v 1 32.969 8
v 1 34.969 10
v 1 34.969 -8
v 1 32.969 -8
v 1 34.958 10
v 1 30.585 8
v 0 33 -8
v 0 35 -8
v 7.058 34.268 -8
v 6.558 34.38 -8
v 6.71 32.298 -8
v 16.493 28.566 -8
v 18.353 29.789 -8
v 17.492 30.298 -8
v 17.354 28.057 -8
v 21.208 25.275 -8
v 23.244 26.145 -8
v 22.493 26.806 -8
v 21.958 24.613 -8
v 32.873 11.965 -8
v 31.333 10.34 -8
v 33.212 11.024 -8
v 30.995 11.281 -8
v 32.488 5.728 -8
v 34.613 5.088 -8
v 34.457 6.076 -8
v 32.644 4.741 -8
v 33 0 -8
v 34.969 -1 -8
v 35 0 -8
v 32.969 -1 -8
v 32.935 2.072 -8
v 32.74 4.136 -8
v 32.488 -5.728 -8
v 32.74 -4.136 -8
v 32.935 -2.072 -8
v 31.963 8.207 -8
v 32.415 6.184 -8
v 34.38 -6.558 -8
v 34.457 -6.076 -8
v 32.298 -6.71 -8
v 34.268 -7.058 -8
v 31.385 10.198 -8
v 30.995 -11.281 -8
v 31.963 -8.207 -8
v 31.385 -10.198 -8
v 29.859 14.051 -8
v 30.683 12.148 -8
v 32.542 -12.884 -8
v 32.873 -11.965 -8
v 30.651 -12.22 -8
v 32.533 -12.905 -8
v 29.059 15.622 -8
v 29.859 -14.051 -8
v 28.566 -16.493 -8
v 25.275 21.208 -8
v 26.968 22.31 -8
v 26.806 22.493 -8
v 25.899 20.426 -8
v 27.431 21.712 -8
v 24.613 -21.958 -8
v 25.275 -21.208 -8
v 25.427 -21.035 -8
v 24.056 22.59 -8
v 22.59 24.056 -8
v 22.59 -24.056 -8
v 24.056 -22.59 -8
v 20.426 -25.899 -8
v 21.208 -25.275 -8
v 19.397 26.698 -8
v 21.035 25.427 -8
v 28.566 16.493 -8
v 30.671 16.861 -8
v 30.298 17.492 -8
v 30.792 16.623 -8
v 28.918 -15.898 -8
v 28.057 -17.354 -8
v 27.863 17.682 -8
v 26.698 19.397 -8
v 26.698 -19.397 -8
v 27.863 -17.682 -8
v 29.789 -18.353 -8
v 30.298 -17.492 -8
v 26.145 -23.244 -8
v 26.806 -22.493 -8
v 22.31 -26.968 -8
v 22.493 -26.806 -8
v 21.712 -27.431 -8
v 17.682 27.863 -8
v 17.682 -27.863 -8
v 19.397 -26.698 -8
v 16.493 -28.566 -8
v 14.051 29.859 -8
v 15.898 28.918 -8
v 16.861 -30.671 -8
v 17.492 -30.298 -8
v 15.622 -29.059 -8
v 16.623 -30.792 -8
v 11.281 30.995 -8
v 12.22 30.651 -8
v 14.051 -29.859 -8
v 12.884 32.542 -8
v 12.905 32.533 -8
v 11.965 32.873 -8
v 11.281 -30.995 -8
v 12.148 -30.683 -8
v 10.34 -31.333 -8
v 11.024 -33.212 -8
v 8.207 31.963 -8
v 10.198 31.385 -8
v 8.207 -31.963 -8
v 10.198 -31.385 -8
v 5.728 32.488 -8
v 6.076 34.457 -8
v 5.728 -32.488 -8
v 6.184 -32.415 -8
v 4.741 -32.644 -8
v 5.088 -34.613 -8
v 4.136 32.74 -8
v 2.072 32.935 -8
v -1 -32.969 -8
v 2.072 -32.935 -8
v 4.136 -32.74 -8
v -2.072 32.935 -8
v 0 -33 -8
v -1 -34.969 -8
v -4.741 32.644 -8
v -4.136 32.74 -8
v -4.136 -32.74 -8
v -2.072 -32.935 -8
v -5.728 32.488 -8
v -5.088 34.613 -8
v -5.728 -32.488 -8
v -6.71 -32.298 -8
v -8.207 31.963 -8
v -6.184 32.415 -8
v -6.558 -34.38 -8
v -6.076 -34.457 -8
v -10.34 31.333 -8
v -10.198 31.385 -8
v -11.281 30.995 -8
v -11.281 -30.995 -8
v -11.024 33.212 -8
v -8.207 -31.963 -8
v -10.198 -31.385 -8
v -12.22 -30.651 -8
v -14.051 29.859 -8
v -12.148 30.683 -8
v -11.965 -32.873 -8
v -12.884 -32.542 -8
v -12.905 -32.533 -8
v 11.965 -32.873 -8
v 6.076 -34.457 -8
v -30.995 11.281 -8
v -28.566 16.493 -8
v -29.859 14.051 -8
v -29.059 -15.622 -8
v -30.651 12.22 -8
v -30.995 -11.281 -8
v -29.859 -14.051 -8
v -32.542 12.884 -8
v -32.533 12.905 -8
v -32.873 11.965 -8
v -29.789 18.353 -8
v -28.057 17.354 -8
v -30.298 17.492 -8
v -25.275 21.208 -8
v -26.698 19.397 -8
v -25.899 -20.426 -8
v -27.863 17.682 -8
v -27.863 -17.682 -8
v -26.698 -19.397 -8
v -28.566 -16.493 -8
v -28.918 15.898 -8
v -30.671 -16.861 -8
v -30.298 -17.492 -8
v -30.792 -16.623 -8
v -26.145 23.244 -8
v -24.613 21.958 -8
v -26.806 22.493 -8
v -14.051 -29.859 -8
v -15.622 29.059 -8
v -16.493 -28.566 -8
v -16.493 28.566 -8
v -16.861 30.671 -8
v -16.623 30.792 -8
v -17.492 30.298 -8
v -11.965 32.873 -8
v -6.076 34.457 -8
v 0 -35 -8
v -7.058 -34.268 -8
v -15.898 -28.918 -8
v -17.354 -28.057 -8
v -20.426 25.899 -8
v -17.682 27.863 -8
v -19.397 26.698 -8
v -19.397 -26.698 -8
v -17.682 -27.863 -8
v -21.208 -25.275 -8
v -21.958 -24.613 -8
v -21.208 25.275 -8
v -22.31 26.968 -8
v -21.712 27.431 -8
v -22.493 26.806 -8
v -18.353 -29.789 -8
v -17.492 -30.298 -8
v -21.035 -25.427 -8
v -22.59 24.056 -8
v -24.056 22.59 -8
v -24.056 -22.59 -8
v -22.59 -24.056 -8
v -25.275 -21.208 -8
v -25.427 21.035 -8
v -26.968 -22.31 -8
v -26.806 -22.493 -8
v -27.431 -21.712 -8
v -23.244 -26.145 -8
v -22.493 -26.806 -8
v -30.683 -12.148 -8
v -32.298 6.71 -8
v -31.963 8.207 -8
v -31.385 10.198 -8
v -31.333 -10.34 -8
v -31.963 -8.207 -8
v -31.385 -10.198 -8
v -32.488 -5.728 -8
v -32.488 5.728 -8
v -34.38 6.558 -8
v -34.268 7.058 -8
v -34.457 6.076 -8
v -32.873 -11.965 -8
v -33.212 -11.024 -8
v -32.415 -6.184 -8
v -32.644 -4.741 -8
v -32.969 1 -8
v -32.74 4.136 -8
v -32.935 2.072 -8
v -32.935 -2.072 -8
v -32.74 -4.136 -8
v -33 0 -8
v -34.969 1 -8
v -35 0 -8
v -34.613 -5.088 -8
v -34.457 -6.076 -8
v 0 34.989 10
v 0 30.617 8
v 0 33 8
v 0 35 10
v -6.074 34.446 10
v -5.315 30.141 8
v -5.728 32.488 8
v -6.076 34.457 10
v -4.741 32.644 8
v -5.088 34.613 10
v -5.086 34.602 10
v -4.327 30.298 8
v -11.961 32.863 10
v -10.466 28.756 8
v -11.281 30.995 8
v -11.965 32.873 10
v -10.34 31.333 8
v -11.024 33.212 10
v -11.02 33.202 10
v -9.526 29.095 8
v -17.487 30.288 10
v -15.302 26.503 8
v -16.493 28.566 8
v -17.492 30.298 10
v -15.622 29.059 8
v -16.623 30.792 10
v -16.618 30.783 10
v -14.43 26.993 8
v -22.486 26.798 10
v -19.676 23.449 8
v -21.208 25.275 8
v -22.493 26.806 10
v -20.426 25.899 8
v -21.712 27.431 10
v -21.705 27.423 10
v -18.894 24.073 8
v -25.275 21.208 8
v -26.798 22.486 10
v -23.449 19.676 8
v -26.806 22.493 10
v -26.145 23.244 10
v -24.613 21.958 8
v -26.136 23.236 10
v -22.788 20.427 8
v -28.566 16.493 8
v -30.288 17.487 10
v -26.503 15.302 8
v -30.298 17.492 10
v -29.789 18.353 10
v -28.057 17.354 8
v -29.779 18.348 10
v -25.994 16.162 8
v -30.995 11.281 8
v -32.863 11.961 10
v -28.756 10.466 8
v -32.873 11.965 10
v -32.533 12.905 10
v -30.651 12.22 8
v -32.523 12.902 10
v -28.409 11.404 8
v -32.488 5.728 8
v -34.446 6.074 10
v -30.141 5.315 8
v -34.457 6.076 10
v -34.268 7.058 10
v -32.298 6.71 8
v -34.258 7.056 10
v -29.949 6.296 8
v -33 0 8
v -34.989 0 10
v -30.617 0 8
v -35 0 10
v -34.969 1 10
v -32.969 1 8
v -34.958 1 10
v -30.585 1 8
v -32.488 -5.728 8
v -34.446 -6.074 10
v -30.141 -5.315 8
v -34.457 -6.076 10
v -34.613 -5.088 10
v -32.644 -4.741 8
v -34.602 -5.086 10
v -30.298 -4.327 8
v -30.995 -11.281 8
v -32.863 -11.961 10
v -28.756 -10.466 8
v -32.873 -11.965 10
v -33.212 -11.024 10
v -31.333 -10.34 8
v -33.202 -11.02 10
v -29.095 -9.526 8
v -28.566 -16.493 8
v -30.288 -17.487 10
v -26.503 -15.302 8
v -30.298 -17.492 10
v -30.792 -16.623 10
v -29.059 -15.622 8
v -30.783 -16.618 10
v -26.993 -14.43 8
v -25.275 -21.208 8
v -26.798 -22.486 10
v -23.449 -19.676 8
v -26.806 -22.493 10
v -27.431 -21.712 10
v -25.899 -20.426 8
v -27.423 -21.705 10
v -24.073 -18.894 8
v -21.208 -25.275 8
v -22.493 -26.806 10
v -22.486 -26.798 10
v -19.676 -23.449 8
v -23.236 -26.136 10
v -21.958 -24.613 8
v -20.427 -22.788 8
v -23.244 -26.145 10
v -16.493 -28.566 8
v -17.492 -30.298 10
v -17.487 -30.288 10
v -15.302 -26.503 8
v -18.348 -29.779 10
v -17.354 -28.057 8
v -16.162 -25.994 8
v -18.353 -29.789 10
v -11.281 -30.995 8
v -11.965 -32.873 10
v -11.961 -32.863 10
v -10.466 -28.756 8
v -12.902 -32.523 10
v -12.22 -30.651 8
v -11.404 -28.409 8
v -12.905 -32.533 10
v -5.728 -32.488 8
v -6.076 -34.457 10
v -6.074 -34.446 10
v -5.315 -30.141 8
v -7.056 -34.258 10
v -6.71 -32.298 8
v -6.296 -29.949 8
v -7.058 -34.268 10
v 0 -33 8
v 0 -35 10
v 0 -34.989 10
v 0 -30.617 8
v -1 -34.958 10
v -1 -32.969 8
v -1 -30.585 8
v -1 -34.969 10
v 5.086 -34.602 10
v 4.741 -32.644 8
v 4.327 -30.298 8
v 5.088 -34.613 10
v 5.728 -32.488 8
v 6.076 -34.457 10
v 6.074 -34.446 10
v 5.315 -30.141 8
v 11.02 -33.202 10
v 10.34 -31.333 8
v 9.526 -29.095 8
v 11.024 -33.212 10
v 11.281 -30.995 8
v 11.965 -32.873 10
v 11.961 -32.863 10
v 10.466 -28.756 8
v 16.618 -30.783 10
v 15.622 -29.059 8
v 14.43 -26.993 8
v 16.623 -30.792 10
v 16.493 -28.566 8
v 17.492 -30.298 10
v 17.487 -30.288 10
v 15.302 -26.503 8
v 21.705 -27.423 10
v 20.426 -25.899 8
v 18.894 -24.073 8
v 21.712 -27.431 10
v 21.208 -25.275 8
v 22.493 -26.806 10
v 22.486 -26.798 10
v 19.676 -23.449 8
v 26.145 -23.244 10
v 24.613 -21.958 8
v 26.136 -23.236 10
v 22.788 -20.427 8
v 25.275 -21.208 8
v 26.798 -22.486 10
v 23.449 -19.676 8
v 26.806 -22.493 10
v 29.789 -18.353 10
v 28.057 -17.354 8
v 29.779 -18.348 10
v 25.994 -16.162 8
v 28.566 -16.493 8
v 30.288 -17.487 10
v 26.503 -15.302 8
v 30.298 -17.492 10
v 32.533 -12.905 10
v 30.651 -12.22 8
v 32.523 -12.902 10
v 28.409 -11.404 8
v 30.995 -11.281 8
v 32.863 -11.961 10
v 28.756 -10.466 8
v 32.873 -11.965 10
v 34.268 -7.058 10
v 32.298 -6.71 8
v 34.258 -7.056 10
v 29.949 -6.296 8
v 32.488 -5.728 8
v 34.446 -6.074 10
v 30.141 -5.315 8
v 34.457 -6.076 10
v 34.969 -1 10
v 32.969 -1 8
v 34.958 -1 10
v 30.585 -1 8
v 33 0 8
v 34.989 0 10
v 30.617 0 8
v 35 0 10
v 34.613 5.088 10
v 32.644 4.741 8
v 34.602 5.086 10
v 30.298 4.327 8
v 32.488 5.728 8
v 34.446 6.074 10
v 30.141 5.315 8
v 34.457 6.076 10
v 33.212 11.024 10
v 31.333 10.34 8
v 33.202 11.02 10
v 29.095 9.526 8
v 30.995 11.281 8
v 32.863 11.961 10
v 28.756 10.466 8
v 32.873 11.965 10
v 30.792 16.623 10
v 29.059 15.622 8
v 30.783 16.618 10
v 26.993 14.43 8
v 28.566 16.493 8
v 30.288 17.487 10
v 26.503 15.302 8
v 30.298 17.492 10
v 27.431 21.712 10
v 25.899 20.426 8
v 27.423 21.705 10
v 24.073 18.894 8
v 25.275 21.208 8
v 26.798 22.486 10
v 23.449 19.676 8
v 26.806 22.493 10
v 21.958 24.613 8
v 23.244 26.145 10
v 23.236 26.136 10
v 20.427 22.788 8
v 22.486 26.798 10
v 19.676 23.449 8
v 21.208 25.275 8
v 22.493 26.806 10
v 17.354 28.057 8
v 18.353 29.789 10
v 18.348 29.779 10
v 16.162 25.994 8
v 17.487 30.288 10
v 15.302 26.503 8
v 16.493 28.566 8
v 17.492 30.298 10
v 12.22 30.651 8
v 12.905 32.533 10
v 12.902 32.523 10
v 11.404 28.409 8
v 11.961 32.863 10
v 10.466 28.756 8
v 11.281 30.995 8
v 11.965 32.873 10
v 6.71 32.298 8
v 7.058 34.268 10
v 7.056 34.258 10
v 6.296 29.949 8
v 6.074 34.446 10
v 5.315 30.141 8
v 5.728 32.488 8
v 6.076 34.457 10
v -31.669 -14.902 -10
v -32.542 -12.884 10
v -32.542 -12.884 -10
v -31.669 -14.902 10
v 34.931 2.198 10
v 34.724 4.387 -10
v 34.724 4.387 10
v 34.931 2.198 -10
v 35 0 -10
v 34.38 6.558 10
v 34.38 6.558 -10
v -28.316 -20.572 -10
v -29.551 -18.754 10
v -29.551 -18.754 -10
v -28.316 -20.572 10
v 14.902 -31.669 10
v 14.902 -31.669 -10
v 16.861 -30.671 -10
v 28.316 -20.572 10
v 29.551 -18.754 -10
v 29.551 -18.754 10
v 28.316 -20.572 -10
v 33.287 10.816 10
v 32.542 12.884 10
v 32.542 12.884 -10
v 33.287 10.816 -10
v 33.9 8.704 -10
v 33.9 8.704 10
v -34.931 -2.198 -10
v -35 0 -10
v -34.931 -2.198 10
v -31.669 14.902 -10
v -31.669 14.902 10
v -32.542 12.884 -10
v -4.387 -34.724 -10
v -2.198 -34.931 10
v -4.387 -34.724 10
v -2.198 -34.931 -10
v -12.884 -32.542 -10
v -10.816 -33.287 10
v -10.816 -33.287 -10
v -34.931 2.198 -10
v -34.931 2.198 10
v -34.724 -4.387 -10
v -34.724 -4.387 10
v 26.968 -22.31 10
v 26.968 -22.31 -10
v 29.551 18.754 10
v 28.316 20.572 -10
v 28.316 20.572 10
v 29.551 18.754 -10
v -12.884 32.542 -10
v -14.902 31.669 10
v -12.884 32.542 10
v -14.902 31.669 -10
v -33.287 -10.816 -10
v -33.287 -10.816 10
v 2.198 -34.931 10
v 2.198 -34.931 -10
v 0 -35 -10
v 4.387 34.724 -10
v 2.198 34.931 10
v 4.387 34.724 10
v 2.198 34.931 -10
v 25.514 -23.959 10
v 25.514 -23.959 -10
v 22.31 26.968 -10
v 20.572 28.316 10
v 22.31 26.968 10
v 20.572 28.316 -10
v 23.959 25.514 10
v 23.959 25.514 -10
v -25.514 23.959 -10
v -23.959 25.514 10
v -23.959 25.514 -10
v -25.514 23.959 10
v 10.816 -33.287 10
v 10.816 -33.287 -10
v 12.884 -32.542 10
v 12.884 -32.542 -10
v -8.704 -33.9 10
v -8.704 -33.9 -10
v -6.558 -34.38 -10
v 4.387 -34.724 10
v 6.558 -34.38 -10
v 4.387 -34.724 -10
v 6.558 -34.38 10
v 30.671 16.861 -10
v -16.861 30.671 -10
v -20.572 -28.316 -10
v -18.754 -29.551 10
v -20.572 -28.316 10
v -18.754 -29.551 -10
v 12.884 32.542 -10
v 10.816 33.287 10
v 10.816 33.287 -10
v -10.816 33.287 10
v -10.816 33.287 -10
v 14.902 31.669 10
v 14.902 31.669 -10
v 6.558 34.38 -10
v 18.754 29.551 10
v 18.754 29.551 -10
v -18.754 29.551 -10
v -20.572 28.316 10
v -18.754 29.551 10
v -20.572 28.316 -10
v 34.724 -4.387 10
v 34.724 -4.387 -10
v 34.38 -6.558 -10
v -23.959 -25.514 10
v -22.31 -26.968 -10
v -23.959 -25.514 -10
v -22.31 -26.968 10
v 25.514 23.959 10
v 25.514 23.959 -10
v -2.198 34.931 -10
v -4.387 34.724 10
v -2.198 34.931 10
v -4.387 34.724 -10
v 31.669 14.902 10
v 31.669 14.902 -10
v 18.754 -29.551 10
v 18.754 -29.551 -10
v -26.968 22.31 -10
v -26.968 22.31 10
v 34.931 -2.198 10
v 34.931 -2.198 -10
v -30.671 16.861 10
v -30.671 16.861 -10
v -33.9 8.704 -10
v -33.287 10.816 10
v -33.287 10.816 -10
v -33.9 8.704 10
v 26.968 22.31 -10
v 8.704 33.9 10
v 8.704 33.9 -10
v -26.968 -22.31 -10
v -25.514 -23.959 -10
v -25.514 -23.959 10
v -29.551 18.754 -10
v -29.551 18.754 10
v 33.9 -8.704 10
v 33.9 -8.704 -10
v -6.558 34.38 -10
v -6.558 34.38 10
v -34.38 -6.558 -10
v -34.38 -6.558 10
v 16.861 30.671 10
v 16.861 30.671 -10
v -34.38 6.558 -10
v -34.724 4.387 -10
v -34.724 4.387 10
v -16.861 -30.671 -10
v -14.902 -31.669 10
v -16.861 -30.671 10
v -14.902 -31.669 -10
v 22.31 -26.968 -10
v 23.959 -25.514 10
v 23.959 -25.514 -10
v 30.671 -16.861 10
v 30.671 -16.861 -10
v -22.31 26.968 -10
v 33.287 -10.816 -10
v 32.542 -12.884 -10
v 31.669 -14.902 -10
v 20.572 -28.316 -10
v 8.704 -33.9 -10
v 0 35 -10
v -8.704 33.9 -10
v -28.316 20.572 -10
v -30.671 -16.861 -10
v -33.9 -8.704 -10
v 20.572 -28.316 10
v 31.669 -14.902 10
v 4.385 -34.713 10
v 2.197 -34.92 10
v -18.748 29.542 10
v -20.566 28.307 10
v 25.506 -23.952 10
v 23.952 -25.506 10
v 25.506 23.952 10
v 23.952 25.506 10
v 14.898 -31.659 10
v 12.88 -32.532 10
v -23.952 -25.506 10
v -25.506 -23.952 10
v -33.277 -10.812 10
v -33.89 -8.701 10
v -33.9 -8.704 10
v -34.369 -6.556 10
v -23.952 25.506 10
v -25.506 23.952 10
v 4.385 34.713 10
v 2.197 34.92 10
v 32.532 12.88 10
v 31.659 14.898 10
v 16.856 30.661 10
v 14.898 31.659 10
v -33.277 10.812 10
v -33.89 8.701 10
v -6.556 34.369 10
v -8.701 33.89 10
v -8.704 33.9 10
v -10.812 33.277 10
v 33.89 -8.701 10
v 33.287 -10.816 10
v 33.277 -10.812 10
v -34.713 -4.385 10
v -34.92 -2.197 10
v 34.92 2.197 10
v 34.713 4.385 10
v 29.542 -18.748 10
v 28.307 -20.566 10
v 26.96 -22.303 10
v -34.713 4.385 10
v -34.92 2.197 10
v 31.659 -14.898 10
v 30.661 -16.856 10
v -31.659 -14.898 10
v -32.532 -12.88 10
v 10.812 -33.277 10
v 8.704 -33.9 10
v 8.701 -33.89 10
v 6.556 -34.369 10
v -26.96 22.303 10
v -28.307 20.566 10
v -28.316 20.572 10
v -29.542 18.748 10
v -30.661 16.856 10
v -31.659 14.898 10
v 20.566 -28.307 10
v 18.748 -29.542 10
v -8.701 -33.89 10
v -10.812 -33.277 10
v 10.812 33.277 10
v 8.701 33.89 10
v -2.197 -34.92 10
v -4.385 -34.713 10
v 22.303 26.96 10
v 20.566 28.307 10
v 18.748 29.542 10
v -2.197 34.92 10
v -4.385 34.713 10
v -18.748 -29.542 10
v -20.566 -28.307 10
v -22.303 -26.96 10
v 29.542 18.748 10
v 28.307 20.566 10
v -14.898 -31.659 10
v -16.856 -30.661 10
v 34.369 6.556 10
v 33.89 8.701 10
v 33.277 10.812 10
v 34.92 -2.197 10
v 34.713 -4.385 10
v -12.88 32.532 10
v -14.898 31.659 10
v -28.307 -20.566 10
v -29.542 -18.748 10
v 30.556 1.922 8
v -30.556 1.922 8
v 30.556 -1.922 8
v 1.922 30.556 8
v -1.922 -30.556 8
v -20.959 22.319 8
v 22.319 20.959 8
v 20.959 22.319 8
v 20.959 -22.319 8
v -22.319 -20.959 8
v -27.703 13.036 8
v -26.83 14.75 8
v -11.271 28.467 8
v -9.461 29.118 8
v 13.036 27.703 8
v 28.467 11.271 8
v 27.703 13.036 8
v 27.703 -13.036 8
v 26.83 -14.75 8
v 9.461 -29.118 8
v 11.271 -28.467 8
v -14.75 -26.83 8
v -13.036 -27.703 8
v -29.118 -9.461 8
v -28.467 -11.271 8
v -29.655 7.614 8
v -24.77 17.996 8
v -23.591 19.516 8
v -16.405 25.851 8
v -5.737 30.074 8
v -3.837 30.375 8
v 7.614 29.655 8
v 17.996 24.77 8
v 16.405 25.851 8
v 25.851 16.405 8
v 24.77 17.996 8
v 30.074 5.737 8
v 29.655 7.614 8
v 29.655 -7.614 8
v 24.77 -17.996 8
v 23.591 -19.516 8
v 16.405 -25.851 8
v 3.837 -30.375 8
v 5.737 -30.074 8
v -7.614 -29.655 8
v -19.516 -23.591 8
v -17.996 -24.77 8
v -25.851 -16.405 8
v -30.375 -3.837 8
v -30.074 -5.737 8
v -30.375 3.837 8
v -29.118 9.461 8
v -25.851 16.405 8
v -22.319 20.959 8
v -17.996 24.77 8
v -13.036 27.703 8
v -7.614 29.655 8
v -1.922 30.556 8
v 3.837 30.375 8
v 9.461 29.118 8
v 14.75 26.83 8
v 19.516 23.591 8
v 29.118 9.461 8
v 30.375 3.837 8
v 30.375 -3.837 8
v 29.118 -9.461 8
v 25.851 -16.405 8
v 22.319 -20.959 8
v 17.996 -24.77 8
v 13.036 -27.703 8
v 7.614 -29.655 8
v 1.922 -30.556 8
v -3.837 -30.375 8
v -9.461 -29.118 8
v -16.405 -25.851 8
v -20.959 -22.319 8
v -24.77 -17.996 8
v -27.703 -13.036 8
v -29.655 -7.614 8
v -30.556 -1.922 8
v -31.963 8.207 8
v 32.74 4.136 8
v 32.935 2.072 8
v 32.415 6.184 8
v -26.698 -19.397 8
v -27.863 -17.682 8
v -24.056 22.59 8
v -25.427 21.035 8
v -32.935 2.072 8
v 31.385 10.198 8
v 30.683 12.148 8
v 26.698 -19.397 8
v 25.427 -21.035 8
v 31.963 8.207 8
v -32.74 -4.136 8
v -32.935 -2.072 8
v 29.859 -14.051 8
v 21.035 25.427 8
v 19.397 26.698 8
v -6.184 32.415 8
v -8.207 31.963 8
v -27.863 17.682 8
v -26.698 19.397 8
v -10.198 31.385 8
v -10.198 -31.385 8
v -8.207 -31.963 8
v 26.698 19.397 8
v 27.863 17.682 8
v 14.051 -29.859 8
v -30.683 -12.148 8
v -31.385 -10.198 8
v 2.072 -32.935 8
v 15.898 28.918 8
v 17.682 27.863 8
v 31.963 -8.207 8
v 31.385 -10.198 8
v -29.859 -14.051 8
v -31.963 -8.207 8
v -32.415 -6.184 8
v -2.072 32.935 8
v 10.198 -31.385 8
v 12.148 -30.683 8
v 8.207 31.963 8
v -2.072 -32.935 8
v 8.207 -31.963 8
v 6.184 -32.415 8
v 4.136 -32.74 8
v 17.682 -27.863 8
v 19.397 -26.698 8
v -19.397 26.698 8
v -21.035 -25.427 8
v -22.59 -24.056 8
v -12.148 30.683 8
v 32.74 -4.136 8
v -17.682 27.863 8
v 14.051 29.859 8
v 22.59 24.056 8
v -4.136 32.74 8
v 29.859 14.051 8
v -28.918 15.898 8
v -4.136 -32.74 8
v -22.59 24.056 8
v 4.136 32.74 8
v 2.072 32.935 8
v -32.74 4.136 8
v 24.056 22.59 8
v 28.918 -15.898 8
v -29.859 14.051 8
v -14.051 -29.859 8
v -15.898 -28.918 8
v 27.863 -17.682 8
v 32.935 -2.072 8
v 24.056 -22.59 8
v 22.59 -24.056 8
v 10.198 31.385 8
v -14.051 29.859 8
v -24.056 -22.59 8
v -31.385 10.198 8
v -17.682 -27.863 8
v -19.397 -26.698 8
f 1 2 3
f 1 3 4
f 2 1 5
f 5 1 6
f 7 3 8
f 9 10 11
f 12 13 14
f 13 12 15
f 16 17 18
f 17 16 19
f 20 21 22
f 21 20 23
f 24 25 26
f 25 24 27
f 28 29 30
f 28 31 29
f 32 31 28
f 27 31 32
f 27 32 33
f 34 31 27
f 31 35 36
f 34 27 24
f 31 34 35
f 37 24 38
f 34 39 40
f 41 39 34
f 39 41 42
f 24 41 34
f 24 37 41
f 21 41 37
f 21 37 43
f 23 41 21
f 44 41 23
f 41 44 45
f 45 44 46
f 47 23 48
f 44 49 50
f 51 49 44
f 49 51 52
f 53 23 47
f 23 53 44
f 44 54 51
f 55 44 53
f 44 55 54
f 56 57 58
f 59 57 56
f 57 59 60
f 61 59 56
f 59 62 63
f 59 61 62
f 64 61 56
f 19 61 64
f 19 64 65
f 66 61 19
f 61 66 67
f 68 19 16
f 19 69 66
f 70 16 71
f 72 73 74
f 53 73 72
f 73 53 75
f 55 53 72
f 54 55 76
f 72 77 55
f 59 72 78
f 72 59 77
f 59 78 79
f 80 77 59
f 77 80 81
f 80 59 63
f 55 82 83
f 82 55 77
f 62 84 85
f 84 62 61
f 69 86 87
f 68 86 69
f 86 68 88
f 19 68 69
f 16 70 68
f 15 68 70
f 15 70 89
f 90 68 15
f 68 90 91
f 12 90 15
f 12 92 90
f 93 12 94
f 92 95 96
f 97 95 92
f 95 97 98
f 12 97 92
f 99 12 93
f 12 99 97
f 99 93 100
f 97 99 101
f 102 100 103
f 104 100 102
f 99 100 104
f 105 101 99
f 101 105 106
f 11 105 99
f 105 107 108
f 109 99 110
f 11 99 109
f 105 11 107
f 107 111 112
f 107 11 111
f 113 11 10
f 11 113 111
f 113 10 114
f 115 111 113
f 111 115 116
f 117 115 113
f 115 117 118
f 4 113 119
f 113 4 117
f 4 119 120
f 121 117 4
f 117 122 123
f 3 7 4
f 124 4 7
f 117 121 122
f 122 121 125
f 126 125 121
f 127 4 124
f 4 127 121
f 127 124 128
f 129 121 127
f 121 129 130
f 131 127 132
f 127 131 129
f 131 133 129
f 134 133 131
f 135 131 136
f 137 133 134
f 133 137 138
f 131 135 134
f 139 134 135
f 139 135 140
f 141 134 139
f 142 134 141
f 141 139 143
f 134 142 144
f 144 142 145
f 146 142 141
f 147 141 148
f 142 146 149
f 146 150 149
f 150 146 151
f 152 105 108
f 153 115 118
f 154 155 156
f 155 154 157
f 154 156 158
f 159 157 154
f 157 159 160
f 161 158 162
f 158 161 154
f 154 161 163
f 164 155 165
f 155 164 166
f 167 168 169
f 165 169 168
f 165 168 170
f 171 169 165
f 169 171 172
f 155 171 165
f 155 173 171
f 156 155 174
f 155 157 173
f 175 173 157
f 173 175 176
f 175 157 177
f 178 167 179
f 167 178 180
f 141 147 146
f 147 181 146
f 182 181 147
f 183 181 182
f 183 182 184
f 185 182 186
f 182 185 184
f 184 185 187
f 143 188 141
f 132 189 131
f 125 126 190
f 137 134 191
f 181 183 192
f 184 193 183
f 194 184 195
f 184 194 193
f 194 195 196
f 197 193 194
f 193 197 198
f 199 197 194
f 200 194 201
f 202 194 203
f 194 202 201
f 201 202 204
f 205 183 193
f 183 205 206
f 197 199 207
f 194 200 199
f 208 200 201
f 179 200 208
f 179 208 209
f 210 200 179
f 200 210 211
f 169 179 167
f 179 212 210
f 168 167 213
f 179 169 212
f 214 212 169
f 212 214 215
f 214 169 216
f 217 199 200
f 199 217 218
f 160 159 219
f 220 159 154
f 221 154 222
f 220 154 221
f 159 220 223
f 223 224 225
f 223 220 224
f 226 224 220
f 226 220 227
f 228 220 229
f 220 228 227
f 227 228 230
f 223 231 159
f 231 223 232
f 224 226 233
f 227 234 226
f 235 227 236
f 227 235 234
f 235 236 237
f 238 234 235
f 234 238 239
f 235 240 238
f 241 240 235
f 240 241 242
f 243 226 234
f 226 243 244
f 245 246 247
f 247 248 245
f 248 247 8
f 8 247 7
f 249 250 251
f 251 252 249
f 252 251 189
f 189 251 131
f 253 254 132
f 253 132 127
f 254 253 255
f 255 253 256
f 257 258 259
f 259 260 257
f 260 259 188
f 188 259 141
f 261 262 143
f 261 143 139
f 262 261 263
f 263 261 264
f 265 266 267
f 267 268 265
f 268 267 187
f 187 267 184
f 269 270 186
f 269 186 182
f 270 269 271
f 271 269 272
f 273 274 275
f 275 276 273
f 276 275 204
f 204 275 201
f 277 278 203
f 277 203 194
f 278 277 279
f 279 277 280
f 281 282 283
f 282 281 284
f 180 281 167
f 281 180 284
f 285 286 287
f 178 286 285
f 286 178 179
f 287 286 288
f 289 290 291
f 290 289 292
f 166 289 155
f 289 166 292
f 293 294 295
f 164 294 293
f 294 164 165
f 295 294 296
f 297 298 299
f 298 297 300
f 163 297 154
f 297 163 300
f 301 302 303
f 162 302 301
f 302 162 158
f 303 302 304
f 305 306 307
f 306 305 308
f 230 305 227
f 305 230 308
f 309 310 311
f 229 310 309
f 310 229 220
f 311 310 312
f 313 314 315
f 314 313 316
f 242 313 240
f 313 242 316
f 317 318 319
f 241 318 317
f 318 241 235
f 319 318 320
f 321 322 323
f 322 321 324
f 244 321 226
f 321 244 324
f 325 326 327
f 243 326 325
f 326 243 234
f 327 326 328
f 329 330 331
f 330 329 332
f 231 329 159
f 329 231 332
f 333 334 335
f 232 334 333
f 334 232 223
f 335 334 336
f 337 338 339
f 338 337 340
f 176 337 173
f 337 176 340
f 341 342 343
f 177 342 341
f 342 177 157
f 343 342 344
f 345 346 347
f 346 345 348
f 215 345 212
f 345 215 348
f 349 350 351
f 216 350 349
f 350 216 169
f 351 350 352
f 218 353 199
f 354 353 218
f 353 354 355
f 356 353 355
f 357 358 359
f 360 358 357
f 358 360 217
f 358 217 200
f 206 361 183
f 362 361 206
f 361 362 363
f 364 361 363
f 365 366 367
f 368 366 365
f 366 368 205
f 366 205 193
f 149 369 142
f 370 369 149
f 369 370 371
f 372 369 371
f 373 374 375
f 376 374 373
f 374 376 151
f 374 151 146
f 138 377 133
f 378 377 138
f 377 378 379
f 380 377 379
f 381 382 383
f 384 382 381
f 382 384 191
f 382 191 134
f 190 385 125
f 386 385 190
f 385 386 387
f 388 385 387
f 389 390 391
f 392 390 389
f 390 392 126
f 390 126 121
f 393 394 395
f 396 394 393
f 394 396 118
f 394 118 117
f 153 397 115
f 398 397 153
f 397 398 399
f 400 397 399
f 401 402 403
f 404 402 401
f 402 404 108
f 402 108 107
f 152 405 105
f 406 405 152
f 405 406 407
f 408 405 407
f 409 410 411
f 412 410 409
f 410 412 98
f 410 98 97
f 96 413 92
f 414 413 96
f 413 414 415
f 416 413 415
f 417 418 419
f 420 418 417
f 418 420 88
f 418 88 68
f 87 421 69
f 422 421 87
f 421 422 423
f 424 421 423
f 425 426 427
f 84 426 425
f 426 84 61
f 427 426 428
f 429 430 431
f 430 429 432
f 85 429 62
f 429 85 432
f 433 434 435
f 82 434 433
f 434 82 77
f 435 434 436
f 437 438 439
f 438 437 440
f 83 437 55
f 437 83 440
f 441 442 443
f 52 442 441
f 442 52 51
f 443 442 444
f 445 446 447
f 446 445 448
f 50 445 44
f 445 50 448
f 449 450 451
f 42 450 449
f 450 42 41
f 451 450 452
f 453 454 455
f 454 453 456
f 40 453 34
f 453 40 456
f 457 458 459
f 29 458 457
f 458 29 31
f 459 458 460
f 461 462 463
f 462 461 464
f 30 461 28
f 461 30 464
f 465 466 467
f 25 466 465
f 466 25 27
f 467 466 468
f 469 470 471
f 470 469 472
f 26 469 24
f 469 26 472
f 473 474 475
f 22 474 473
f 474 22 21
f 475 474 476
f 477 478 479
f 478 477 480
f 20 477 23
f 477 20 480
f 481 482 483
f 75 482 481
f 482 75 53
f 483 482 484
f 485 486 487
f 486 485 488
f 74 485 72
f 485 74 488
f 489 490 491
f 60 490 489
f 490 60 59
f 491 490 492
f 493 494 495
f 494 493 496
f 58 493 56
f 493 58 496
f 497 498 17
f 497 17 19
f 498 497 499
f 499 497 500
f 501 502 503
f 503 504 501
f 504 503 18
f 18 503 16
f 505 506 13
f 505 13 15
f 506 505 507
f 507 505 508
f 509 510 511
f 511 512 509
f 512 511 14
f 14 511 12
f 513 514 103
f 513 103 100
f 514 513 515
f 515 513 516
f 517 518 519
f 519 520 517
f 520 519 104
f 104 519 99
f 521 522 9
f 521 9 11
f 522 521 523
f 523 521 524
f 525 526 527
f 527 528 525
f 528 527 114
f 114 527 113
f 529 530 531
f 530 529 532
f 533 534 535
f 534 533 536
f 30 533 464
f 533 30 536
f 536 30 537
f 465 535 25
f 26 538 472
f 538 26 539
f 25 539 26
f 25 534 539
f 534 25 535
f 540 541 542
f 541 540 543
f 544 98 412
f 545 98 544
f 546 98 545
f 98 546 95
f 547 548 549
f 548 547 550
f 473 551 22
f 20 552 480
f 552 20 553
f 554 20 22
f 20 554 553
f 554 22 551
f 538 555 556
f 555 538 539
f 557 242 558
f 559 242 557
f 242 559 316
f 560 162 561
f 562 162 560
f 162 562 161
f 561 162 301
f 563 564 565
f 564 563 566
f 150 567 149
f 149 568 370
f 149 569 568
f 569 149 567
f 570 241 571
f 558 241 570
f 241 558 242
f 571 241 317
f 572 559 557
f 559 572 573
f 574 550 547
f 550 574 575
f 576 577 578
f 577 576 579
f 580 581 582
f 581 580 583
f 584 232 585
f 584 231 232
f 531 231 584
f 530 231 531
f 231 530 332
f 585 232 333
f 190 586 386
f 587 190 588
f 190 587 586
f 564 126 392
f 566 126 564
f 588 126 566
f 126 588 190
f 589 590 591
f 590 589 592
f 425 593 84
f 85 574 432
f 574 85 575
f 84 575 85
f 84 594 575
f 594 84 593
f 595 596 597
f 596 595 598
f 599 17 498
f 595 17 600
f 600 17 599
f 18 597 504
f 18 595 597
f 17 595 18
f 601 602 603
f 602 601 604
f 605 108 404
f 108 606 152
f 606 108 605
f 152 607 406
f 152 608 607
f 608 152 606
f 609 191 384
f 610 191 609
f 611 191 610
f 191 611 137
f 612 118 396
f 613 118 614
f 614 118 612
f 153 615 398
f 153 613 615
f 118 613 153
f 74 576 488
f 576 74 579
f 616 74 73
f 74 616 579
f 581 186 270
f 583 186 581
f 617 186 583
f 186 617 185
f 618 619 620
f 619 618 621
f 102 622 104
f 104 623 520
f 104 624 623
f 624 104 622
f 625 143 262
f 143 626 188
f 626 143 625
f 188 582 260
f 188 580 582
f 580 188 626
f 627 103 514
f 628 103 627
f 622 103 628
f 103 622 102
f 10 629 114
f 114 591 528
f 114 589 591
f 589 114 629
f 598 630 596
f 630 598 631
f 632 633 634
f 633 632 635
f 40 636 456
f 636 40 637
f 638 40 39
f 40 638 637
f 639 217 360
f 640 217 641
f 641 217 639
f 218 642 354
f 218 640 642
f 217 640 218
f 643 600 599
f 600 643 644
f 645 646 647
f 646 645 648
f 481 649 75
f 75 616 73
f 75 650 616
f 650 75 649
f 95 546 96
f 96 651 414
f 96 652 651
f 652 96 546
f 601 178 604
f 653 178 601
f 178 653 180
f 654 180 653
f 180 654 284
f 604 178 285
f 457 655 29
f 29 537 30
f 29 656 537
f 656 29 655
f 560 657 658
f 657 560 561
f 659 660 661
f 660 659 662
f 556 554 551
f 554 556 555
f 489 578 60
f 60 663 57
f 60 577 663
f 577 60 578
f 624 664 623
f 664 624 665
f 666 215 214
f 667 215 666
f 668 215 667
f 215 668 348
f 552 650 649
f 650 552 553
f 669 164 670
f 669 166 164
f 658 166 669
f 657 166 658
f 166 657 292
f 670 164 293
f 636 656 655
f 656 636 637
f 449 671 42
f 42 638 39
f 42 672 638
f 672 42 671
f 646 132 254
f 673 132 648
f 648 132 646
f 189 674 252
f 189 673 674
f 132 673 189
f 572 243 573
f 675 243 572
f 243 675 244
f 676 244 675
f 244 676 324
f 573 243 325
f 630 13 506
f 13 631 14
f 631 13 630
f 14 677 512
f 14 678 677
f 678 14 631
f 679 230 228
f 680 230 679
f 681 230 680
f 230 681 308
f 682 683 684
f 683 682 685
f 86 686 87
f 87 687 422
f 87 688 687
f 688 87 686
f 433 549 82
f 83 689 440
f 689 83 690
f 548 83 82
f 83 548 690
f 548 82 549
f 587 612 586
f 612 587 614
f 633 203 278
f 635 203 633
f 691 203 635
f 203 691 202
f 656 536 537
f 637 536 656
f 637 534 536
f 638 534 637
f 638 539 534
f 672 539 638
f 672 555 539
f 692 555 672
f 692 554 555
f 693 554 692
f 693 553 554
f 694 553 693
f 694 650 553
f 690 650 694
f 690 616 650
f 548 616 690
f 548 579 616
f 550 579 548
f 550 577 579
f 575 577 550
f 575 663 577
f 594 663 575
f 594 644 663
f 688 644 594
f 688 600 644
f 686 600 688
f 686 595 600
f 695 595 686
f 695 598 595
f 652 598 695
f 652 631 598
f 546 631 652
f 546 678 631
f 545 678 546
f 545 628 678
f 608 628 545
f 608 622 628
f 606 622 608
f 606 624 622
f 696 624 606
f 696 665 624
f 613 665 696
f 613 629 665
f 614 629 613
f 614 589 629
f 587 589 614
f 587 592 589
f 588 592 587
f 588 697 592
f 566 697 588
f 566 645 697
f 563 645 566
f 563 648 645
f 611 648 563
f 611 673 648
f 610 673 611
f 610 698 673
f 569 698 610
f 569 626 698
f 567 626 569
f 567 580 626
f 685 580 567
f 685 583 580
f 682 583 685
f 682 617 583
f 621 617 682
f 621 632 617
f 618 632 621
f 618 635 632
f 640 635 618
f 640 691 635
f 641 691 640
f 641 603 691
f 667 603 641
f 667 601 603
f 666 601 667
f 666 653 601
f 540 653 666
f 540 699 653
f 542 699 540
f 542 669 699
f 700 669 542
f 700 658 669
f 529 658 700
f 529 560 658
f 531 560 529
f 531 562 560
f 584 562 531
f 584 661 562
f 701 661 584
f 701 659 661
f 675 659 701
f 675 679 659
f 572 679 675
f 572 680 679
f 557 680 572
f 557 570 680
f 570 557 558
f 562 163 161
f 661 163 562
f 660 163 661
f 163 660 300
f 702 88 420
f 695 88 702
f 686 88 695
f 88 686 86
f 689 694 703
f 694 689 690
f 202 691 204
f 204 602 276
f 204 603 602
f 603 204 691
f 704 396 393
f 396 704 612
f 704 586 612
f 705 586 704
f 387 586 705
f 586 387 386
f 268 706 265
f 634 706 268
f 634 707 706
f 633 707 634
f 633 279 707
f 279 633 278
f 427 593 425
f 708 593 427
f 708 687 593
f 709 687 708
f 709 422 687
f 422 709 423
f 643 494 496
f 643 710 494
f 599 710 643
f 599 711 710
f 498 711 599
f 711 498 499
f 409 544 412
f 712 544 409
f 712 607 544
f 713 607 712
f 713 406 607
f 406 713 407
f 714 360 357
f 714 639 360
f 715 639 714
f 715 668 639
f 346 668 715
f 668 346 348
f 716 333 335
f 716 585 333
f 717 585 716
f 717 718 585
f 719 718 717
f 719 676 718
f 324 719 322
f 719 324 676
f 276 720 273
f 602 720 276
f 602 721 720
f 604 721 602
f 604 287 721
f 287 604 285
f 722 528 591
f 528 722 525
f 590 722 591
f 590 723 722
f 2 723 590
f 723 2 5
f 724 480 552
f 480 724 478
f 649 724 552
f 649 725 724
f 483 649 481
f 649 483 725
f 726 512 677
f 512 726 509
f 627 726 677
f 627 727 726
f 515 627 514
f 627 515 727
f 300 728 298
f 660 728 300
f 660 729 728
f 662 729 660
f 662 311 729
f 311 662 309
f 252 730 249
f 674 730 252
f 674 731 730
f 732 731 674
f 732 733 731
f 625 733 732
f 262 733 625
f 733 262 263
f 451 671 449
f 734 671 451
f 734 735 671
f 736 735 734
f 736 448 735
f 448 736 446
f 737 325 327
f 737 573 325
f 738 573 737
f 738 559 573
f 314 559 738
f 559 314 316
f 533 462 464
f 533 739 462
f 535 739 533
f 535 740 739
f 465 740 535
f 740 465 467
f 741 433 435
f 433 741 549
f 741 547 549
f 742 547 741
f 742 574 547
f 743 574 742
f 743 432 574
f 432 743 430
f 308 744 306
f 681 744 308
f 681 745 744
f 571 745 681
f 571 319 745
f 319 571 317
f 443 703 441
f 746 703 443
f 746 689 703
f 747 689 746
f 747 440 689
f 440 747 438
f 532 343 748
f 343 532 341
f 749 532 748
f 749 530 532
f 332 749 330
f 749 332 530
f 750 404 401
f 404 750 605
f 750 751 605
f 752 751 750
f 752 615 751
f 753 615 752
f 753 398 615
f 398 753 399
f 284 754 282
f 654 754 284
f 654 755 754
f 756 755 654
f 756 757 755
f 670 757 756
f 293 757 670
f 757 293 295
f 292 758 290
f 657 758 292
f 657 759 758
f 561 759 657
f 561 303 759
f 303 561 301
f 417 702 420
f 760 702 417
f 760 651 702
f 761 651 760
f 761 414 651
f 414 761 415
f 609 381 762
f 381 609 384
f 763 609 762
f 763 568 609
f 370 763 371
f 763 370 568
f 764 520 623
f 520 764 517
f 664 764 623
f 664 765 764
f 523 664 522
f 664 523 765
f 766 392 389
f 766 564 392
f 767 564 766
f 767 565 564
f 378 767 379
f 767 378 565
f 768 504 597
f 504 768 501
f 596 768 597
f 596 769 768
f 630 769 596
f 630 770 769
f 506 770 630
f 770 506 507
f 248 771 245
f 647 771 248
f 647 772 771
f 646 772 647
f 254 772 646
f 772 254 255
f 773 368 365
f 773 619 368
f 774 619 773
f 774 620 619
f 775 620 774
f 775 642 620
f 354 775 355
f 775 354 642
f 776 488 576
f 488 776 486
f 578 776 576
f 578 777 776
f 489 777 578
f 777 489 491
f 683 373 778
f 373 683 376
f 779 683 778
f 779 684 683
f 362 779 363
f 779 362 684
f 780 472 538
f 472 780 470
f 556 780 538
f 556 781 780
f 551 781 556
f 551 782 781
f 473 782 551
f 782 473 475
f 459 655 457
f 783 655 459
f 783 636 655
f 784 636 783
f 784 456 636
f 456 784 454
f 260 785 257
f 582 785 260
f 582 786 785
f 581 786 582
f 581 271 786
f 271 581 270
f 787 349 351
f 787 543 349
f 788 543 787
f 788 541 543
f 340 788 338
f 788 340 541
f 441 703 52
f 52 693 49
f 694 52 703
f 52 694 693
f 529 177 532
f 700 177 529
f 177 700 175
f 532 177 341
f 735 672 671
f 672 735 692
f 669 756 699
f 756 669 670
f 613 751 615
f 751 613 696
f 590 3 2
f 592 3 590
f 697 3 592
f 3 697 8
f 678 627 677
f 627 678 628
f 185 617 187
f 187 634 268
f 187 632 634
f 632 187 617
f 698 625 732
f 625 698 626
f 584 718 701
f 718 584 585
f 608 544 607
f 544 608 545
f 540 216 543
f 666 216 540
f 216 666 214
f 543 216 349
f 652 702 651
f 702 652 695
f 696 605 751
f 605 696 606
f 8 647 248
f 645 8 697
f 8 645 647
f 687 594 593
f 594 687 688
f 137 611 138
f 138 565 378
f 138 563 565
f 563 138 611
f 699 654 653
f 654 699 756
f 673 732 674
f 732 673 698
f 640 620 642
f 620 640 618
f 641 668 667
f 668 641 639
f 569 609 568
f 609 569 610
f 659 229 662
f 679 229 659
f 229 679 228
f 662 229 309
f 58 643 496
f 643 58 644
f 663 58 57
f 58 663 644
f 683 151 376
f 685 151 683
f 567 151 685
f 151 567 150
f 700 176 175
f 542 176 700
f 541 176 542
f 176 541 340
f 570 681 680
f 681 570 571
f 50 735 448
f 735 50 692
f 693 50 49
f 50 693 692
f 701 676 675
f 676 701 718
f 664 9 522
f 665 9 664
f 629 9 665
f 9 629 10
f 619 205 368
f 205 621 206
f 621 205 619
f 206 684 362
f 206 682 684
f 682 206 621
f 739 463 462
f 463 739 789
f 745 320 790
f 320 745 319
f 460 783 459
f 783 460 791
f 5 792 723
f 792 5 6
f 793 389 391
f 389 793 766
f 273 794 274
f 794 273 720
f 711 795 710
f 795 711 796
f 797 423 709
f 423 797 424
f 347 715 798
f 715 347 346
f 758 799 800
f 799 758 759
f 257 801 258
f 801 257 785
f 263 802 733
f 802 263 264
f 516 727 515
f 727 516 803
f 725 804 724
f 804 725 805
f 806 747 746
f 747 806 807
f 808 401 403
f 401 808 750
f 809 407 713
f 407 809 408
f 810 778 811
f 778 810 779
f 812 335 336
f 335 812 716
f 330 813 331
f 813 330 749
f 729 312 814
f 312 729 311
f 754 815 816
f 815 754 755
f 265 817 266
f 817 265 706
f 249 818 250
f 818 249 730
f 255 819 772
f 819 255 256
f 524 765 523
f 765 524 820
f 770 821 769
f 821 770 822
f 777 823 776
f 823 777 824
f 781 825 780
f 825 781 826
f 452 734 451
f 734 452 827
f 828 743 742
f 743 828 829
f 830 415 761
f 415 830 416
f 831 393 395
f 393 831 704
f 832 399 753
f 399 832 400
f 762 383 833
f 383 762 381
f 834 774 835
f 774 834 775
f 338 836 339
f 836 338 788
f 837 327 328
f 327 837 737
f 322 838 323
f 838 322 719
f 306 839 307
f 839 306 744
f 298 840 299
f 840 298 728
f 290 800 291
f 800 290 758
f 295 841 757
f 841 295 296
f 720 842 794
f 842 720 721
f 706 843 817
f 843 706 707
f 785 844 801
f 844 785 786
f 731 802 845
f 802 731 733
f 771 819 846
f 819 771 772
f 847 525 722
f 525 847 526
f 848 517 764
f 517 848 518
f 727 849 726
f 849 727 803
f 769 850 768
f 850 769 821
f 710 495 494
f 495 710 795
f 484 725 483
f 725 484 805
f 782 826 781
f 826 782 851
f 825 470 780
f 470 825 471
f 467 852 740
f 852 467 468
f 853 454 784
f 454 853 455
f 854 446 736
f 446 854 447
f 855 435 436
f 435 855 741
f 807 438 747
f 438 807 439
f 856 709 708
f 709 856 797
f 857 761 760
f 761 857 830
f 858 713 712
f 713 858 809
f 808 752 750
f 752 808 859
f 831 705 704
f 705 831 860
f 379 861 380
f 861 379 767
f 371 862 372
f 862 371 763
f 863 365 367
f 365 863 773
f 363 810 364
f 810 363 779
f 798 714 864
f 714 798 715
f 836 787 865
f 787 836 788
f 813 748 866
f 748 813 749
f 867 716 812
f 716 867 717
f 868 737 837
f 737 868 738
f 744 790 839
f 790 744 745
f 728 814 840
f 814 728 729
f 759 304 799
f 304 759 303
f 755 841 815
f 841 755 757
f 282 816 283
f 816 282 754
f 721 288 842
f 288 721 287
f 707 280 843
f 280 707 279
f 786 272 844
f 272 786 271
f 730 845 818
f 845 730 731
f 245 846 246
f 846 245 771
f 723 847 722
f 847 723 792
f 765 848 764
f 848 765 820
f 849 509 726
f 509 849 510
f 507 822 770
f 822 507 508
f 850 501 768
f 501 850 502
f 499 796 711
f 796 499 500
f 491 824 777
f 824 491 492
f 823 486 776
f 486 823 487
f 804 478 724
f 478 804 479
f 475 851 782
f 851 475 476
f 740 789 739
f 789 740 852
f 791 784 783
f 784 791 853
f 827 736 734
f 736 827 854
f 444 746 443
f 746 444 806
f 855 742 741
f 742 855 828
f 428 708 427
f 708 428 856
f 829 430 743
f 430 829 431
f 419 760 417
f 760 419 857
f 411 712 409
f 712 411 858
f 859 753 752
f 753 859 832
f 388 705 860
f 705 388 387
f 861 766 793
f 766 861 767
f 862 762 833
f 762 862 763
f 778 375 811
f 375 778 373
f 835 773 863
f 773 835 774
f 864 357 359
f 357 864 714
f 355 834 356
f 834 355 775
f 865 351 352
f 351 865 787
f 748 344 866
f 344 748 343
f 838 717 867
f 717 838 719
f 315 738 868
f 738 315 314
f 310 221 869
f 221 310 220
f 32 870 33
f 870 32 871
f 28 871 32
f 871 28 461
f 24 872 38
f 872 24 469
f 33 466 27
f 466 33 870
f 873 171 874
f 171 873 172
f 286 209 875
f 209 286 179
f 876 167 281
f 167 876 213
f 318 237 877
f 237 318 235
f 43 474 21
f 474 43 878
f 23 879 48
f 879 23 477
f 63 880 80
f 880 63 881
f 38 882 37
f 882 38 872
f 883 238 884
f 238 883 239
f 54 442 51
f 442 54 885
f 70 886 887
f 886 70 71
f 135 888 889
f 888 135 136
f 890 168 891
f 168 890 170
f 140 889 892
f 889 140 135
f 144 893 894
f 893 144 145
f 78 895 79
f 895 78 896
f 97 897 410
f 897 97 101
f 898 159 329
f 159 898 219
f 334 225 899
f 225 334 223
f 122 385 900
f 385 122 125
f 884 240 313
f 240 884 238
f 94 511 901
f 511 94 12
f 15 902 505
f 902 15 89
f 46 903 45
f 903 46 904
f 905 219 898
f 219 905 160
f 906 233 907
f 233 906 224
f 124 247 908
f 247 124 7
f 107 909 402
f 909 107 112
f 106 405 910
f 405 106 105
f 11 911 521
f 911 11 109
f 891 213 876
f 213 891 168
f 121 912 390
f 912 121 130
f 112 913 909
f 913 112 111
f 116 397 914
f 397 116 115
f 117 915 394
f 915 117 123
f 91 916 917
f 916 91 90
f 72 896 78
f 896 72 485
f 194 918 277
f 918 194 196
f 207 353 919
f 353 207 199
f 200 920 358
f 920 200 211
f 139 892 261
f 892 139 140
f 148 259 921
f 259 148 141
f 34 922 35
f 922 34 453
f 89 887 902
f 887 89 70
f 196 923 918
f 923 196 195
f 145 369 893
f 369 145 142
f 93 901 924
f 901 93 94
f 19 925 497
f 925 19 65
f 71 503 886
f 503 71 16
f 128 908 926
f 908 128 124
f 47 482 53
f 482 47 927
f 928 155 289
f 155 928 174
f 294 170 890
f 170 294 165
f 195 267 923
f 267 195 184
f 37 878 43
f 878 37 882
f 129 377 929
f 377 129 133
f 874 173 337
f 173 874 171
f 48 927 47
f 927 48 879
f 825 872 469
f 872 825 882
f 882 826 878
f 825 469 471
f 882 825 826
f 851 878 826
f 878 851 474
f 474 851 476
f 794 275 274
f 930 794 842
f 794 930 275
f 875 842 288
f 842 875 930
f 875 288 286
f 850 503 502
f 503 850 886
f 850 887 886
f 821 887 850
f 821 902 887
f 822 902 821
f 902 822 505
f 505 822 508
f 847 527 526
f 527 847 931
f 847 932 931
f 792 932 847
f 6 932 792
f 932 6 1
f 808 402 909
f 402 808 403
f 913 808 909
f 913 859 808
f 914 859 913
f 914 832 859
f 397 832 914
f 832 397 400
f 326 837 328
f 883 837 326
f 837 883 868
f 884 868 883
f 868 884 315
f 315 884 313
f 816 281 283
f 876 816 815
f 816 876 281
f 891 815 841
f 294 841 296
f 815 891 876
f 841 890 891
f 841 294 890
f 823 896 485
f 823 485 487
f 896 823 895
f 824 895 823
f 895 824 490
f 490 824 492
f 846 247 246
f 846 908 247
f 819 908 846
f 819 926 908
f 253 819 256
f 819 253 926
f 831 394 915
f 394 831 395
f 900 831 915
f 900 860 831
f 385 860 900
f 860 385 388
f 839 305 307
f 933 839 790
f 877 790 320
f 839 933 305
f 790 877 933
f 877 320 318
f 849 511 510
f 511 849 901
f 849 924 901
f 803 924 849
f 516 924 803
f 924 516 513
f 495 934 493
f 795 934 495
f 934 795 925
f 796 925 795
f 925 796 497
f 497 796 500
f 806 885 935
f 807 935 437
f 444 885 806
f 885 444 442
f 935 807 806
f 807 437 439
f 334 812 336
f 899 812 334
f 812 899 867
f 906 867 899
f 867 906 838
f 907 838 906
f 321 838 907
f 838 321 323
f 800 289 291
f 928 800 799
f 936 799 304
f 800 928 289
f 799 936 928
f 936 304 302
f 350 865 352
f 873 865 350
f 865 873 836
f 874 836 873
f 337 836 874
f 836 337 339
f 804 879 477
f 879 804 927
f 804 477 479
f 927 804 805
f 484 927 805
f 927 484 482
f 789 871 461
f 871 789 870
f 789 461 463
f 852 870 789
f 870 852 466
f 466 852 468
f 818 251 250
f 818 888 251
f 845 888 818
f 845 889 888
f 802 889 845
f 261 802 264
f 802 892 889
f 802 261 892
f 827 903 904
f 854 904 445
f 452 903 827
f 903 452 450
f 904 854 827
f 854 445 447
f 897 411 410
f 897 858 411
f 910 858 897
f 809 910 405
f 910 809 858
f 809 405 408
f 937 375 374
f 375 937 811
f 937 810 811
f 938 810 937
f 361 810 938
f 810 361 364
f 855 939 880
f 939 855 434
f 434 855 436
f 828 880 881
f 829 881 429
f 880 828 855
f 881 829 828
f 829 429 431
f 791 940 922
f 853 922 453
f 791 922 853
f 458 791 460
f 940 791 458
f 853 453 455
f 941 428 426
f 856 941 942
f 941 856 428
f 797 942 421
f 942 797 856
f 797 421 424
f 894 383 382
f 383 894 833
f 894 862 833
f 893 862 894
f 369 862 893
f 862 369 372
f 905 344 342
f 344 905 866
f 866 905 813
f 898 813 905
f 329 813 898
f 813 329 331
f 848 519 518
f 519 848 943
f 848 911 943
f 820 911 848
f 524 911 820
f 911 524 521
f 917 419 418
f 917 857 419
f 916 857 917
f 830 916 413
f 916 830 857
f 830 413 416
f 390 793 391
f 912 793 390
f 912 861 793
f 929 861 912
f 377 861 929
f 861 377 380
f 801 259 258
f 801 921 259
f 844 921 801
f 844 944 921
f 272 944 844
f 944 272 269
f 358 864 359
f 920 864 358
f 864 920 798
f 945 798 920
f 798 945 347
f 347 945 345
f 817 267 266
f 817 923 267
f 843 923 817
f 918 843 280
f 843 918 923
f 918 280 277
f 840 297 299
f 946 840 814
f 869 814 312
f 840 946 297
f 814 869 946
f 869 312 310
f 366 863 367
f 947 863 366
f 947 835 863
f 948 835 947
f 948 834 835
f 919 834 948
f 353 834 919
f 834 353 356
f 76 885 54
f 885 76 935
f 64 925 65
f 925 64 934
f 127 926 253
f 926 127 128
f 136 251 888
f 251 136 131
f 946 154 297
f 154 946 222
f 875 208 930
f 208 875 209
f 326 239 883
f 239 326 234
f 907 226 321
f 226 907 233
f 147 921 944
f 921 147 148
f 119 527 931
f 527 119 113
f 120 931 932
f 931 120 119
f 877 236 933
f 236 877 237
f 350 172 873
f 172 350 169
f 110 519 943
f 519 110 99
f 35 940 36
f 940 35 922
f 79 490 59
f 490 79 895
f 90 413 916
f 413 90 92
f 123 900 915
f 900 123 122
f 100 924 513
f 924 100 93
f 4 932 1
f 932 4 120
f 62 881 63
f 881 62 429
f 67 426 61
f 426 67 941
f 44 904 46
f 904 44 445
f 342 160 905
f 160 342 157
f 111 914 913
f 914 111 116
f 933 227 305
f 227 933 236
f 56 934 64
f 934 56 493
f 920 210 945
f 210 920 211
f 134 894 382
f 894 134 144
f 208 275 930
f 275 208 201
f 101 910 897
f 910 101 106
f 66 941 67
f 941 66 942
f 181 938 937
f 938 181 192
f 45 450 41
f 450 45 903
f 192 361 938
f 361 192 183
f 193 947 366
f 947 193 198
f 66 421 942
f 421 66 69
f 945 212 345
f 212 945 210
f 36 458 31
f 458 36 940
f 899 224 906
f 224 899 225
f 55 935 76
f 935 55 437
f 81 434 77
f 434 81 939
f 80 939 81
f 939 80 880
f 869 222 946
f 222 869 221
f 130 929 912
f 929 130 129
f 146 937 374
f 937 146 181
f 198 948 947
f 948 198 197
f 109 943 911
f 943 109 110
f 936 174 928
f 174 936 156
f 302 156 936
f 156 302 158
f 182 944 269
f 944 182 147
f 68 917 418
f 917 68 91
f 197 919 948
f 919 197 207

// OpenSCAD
module capuchon(r, h, w, fn = 32) {
    radioExt = r + w;
    difference() {
        cylinder(r = radioExt, h = h, center = true, $fn = fn);
        for (i = [0:10:360]) translate([0, 0, (-h / 2) + w]) rotate([0, 0, i]) cube([1, radioExt + 1, h], center = false);
        translate([0, 0, w]) cylinder(r1 = 0, r2 = radioExt, h = h + 0.01 - (2*w), center = true, $fn = fn);
        cylinder(r = r, h = h - (2*w), center = true, $fn = fn);
    }  
}

// Capuchón (r es el radio interior, h es la altura, w es el grosor de la pared)
capuchon(r = 33, h = 20, w = 2, fn = 100);
